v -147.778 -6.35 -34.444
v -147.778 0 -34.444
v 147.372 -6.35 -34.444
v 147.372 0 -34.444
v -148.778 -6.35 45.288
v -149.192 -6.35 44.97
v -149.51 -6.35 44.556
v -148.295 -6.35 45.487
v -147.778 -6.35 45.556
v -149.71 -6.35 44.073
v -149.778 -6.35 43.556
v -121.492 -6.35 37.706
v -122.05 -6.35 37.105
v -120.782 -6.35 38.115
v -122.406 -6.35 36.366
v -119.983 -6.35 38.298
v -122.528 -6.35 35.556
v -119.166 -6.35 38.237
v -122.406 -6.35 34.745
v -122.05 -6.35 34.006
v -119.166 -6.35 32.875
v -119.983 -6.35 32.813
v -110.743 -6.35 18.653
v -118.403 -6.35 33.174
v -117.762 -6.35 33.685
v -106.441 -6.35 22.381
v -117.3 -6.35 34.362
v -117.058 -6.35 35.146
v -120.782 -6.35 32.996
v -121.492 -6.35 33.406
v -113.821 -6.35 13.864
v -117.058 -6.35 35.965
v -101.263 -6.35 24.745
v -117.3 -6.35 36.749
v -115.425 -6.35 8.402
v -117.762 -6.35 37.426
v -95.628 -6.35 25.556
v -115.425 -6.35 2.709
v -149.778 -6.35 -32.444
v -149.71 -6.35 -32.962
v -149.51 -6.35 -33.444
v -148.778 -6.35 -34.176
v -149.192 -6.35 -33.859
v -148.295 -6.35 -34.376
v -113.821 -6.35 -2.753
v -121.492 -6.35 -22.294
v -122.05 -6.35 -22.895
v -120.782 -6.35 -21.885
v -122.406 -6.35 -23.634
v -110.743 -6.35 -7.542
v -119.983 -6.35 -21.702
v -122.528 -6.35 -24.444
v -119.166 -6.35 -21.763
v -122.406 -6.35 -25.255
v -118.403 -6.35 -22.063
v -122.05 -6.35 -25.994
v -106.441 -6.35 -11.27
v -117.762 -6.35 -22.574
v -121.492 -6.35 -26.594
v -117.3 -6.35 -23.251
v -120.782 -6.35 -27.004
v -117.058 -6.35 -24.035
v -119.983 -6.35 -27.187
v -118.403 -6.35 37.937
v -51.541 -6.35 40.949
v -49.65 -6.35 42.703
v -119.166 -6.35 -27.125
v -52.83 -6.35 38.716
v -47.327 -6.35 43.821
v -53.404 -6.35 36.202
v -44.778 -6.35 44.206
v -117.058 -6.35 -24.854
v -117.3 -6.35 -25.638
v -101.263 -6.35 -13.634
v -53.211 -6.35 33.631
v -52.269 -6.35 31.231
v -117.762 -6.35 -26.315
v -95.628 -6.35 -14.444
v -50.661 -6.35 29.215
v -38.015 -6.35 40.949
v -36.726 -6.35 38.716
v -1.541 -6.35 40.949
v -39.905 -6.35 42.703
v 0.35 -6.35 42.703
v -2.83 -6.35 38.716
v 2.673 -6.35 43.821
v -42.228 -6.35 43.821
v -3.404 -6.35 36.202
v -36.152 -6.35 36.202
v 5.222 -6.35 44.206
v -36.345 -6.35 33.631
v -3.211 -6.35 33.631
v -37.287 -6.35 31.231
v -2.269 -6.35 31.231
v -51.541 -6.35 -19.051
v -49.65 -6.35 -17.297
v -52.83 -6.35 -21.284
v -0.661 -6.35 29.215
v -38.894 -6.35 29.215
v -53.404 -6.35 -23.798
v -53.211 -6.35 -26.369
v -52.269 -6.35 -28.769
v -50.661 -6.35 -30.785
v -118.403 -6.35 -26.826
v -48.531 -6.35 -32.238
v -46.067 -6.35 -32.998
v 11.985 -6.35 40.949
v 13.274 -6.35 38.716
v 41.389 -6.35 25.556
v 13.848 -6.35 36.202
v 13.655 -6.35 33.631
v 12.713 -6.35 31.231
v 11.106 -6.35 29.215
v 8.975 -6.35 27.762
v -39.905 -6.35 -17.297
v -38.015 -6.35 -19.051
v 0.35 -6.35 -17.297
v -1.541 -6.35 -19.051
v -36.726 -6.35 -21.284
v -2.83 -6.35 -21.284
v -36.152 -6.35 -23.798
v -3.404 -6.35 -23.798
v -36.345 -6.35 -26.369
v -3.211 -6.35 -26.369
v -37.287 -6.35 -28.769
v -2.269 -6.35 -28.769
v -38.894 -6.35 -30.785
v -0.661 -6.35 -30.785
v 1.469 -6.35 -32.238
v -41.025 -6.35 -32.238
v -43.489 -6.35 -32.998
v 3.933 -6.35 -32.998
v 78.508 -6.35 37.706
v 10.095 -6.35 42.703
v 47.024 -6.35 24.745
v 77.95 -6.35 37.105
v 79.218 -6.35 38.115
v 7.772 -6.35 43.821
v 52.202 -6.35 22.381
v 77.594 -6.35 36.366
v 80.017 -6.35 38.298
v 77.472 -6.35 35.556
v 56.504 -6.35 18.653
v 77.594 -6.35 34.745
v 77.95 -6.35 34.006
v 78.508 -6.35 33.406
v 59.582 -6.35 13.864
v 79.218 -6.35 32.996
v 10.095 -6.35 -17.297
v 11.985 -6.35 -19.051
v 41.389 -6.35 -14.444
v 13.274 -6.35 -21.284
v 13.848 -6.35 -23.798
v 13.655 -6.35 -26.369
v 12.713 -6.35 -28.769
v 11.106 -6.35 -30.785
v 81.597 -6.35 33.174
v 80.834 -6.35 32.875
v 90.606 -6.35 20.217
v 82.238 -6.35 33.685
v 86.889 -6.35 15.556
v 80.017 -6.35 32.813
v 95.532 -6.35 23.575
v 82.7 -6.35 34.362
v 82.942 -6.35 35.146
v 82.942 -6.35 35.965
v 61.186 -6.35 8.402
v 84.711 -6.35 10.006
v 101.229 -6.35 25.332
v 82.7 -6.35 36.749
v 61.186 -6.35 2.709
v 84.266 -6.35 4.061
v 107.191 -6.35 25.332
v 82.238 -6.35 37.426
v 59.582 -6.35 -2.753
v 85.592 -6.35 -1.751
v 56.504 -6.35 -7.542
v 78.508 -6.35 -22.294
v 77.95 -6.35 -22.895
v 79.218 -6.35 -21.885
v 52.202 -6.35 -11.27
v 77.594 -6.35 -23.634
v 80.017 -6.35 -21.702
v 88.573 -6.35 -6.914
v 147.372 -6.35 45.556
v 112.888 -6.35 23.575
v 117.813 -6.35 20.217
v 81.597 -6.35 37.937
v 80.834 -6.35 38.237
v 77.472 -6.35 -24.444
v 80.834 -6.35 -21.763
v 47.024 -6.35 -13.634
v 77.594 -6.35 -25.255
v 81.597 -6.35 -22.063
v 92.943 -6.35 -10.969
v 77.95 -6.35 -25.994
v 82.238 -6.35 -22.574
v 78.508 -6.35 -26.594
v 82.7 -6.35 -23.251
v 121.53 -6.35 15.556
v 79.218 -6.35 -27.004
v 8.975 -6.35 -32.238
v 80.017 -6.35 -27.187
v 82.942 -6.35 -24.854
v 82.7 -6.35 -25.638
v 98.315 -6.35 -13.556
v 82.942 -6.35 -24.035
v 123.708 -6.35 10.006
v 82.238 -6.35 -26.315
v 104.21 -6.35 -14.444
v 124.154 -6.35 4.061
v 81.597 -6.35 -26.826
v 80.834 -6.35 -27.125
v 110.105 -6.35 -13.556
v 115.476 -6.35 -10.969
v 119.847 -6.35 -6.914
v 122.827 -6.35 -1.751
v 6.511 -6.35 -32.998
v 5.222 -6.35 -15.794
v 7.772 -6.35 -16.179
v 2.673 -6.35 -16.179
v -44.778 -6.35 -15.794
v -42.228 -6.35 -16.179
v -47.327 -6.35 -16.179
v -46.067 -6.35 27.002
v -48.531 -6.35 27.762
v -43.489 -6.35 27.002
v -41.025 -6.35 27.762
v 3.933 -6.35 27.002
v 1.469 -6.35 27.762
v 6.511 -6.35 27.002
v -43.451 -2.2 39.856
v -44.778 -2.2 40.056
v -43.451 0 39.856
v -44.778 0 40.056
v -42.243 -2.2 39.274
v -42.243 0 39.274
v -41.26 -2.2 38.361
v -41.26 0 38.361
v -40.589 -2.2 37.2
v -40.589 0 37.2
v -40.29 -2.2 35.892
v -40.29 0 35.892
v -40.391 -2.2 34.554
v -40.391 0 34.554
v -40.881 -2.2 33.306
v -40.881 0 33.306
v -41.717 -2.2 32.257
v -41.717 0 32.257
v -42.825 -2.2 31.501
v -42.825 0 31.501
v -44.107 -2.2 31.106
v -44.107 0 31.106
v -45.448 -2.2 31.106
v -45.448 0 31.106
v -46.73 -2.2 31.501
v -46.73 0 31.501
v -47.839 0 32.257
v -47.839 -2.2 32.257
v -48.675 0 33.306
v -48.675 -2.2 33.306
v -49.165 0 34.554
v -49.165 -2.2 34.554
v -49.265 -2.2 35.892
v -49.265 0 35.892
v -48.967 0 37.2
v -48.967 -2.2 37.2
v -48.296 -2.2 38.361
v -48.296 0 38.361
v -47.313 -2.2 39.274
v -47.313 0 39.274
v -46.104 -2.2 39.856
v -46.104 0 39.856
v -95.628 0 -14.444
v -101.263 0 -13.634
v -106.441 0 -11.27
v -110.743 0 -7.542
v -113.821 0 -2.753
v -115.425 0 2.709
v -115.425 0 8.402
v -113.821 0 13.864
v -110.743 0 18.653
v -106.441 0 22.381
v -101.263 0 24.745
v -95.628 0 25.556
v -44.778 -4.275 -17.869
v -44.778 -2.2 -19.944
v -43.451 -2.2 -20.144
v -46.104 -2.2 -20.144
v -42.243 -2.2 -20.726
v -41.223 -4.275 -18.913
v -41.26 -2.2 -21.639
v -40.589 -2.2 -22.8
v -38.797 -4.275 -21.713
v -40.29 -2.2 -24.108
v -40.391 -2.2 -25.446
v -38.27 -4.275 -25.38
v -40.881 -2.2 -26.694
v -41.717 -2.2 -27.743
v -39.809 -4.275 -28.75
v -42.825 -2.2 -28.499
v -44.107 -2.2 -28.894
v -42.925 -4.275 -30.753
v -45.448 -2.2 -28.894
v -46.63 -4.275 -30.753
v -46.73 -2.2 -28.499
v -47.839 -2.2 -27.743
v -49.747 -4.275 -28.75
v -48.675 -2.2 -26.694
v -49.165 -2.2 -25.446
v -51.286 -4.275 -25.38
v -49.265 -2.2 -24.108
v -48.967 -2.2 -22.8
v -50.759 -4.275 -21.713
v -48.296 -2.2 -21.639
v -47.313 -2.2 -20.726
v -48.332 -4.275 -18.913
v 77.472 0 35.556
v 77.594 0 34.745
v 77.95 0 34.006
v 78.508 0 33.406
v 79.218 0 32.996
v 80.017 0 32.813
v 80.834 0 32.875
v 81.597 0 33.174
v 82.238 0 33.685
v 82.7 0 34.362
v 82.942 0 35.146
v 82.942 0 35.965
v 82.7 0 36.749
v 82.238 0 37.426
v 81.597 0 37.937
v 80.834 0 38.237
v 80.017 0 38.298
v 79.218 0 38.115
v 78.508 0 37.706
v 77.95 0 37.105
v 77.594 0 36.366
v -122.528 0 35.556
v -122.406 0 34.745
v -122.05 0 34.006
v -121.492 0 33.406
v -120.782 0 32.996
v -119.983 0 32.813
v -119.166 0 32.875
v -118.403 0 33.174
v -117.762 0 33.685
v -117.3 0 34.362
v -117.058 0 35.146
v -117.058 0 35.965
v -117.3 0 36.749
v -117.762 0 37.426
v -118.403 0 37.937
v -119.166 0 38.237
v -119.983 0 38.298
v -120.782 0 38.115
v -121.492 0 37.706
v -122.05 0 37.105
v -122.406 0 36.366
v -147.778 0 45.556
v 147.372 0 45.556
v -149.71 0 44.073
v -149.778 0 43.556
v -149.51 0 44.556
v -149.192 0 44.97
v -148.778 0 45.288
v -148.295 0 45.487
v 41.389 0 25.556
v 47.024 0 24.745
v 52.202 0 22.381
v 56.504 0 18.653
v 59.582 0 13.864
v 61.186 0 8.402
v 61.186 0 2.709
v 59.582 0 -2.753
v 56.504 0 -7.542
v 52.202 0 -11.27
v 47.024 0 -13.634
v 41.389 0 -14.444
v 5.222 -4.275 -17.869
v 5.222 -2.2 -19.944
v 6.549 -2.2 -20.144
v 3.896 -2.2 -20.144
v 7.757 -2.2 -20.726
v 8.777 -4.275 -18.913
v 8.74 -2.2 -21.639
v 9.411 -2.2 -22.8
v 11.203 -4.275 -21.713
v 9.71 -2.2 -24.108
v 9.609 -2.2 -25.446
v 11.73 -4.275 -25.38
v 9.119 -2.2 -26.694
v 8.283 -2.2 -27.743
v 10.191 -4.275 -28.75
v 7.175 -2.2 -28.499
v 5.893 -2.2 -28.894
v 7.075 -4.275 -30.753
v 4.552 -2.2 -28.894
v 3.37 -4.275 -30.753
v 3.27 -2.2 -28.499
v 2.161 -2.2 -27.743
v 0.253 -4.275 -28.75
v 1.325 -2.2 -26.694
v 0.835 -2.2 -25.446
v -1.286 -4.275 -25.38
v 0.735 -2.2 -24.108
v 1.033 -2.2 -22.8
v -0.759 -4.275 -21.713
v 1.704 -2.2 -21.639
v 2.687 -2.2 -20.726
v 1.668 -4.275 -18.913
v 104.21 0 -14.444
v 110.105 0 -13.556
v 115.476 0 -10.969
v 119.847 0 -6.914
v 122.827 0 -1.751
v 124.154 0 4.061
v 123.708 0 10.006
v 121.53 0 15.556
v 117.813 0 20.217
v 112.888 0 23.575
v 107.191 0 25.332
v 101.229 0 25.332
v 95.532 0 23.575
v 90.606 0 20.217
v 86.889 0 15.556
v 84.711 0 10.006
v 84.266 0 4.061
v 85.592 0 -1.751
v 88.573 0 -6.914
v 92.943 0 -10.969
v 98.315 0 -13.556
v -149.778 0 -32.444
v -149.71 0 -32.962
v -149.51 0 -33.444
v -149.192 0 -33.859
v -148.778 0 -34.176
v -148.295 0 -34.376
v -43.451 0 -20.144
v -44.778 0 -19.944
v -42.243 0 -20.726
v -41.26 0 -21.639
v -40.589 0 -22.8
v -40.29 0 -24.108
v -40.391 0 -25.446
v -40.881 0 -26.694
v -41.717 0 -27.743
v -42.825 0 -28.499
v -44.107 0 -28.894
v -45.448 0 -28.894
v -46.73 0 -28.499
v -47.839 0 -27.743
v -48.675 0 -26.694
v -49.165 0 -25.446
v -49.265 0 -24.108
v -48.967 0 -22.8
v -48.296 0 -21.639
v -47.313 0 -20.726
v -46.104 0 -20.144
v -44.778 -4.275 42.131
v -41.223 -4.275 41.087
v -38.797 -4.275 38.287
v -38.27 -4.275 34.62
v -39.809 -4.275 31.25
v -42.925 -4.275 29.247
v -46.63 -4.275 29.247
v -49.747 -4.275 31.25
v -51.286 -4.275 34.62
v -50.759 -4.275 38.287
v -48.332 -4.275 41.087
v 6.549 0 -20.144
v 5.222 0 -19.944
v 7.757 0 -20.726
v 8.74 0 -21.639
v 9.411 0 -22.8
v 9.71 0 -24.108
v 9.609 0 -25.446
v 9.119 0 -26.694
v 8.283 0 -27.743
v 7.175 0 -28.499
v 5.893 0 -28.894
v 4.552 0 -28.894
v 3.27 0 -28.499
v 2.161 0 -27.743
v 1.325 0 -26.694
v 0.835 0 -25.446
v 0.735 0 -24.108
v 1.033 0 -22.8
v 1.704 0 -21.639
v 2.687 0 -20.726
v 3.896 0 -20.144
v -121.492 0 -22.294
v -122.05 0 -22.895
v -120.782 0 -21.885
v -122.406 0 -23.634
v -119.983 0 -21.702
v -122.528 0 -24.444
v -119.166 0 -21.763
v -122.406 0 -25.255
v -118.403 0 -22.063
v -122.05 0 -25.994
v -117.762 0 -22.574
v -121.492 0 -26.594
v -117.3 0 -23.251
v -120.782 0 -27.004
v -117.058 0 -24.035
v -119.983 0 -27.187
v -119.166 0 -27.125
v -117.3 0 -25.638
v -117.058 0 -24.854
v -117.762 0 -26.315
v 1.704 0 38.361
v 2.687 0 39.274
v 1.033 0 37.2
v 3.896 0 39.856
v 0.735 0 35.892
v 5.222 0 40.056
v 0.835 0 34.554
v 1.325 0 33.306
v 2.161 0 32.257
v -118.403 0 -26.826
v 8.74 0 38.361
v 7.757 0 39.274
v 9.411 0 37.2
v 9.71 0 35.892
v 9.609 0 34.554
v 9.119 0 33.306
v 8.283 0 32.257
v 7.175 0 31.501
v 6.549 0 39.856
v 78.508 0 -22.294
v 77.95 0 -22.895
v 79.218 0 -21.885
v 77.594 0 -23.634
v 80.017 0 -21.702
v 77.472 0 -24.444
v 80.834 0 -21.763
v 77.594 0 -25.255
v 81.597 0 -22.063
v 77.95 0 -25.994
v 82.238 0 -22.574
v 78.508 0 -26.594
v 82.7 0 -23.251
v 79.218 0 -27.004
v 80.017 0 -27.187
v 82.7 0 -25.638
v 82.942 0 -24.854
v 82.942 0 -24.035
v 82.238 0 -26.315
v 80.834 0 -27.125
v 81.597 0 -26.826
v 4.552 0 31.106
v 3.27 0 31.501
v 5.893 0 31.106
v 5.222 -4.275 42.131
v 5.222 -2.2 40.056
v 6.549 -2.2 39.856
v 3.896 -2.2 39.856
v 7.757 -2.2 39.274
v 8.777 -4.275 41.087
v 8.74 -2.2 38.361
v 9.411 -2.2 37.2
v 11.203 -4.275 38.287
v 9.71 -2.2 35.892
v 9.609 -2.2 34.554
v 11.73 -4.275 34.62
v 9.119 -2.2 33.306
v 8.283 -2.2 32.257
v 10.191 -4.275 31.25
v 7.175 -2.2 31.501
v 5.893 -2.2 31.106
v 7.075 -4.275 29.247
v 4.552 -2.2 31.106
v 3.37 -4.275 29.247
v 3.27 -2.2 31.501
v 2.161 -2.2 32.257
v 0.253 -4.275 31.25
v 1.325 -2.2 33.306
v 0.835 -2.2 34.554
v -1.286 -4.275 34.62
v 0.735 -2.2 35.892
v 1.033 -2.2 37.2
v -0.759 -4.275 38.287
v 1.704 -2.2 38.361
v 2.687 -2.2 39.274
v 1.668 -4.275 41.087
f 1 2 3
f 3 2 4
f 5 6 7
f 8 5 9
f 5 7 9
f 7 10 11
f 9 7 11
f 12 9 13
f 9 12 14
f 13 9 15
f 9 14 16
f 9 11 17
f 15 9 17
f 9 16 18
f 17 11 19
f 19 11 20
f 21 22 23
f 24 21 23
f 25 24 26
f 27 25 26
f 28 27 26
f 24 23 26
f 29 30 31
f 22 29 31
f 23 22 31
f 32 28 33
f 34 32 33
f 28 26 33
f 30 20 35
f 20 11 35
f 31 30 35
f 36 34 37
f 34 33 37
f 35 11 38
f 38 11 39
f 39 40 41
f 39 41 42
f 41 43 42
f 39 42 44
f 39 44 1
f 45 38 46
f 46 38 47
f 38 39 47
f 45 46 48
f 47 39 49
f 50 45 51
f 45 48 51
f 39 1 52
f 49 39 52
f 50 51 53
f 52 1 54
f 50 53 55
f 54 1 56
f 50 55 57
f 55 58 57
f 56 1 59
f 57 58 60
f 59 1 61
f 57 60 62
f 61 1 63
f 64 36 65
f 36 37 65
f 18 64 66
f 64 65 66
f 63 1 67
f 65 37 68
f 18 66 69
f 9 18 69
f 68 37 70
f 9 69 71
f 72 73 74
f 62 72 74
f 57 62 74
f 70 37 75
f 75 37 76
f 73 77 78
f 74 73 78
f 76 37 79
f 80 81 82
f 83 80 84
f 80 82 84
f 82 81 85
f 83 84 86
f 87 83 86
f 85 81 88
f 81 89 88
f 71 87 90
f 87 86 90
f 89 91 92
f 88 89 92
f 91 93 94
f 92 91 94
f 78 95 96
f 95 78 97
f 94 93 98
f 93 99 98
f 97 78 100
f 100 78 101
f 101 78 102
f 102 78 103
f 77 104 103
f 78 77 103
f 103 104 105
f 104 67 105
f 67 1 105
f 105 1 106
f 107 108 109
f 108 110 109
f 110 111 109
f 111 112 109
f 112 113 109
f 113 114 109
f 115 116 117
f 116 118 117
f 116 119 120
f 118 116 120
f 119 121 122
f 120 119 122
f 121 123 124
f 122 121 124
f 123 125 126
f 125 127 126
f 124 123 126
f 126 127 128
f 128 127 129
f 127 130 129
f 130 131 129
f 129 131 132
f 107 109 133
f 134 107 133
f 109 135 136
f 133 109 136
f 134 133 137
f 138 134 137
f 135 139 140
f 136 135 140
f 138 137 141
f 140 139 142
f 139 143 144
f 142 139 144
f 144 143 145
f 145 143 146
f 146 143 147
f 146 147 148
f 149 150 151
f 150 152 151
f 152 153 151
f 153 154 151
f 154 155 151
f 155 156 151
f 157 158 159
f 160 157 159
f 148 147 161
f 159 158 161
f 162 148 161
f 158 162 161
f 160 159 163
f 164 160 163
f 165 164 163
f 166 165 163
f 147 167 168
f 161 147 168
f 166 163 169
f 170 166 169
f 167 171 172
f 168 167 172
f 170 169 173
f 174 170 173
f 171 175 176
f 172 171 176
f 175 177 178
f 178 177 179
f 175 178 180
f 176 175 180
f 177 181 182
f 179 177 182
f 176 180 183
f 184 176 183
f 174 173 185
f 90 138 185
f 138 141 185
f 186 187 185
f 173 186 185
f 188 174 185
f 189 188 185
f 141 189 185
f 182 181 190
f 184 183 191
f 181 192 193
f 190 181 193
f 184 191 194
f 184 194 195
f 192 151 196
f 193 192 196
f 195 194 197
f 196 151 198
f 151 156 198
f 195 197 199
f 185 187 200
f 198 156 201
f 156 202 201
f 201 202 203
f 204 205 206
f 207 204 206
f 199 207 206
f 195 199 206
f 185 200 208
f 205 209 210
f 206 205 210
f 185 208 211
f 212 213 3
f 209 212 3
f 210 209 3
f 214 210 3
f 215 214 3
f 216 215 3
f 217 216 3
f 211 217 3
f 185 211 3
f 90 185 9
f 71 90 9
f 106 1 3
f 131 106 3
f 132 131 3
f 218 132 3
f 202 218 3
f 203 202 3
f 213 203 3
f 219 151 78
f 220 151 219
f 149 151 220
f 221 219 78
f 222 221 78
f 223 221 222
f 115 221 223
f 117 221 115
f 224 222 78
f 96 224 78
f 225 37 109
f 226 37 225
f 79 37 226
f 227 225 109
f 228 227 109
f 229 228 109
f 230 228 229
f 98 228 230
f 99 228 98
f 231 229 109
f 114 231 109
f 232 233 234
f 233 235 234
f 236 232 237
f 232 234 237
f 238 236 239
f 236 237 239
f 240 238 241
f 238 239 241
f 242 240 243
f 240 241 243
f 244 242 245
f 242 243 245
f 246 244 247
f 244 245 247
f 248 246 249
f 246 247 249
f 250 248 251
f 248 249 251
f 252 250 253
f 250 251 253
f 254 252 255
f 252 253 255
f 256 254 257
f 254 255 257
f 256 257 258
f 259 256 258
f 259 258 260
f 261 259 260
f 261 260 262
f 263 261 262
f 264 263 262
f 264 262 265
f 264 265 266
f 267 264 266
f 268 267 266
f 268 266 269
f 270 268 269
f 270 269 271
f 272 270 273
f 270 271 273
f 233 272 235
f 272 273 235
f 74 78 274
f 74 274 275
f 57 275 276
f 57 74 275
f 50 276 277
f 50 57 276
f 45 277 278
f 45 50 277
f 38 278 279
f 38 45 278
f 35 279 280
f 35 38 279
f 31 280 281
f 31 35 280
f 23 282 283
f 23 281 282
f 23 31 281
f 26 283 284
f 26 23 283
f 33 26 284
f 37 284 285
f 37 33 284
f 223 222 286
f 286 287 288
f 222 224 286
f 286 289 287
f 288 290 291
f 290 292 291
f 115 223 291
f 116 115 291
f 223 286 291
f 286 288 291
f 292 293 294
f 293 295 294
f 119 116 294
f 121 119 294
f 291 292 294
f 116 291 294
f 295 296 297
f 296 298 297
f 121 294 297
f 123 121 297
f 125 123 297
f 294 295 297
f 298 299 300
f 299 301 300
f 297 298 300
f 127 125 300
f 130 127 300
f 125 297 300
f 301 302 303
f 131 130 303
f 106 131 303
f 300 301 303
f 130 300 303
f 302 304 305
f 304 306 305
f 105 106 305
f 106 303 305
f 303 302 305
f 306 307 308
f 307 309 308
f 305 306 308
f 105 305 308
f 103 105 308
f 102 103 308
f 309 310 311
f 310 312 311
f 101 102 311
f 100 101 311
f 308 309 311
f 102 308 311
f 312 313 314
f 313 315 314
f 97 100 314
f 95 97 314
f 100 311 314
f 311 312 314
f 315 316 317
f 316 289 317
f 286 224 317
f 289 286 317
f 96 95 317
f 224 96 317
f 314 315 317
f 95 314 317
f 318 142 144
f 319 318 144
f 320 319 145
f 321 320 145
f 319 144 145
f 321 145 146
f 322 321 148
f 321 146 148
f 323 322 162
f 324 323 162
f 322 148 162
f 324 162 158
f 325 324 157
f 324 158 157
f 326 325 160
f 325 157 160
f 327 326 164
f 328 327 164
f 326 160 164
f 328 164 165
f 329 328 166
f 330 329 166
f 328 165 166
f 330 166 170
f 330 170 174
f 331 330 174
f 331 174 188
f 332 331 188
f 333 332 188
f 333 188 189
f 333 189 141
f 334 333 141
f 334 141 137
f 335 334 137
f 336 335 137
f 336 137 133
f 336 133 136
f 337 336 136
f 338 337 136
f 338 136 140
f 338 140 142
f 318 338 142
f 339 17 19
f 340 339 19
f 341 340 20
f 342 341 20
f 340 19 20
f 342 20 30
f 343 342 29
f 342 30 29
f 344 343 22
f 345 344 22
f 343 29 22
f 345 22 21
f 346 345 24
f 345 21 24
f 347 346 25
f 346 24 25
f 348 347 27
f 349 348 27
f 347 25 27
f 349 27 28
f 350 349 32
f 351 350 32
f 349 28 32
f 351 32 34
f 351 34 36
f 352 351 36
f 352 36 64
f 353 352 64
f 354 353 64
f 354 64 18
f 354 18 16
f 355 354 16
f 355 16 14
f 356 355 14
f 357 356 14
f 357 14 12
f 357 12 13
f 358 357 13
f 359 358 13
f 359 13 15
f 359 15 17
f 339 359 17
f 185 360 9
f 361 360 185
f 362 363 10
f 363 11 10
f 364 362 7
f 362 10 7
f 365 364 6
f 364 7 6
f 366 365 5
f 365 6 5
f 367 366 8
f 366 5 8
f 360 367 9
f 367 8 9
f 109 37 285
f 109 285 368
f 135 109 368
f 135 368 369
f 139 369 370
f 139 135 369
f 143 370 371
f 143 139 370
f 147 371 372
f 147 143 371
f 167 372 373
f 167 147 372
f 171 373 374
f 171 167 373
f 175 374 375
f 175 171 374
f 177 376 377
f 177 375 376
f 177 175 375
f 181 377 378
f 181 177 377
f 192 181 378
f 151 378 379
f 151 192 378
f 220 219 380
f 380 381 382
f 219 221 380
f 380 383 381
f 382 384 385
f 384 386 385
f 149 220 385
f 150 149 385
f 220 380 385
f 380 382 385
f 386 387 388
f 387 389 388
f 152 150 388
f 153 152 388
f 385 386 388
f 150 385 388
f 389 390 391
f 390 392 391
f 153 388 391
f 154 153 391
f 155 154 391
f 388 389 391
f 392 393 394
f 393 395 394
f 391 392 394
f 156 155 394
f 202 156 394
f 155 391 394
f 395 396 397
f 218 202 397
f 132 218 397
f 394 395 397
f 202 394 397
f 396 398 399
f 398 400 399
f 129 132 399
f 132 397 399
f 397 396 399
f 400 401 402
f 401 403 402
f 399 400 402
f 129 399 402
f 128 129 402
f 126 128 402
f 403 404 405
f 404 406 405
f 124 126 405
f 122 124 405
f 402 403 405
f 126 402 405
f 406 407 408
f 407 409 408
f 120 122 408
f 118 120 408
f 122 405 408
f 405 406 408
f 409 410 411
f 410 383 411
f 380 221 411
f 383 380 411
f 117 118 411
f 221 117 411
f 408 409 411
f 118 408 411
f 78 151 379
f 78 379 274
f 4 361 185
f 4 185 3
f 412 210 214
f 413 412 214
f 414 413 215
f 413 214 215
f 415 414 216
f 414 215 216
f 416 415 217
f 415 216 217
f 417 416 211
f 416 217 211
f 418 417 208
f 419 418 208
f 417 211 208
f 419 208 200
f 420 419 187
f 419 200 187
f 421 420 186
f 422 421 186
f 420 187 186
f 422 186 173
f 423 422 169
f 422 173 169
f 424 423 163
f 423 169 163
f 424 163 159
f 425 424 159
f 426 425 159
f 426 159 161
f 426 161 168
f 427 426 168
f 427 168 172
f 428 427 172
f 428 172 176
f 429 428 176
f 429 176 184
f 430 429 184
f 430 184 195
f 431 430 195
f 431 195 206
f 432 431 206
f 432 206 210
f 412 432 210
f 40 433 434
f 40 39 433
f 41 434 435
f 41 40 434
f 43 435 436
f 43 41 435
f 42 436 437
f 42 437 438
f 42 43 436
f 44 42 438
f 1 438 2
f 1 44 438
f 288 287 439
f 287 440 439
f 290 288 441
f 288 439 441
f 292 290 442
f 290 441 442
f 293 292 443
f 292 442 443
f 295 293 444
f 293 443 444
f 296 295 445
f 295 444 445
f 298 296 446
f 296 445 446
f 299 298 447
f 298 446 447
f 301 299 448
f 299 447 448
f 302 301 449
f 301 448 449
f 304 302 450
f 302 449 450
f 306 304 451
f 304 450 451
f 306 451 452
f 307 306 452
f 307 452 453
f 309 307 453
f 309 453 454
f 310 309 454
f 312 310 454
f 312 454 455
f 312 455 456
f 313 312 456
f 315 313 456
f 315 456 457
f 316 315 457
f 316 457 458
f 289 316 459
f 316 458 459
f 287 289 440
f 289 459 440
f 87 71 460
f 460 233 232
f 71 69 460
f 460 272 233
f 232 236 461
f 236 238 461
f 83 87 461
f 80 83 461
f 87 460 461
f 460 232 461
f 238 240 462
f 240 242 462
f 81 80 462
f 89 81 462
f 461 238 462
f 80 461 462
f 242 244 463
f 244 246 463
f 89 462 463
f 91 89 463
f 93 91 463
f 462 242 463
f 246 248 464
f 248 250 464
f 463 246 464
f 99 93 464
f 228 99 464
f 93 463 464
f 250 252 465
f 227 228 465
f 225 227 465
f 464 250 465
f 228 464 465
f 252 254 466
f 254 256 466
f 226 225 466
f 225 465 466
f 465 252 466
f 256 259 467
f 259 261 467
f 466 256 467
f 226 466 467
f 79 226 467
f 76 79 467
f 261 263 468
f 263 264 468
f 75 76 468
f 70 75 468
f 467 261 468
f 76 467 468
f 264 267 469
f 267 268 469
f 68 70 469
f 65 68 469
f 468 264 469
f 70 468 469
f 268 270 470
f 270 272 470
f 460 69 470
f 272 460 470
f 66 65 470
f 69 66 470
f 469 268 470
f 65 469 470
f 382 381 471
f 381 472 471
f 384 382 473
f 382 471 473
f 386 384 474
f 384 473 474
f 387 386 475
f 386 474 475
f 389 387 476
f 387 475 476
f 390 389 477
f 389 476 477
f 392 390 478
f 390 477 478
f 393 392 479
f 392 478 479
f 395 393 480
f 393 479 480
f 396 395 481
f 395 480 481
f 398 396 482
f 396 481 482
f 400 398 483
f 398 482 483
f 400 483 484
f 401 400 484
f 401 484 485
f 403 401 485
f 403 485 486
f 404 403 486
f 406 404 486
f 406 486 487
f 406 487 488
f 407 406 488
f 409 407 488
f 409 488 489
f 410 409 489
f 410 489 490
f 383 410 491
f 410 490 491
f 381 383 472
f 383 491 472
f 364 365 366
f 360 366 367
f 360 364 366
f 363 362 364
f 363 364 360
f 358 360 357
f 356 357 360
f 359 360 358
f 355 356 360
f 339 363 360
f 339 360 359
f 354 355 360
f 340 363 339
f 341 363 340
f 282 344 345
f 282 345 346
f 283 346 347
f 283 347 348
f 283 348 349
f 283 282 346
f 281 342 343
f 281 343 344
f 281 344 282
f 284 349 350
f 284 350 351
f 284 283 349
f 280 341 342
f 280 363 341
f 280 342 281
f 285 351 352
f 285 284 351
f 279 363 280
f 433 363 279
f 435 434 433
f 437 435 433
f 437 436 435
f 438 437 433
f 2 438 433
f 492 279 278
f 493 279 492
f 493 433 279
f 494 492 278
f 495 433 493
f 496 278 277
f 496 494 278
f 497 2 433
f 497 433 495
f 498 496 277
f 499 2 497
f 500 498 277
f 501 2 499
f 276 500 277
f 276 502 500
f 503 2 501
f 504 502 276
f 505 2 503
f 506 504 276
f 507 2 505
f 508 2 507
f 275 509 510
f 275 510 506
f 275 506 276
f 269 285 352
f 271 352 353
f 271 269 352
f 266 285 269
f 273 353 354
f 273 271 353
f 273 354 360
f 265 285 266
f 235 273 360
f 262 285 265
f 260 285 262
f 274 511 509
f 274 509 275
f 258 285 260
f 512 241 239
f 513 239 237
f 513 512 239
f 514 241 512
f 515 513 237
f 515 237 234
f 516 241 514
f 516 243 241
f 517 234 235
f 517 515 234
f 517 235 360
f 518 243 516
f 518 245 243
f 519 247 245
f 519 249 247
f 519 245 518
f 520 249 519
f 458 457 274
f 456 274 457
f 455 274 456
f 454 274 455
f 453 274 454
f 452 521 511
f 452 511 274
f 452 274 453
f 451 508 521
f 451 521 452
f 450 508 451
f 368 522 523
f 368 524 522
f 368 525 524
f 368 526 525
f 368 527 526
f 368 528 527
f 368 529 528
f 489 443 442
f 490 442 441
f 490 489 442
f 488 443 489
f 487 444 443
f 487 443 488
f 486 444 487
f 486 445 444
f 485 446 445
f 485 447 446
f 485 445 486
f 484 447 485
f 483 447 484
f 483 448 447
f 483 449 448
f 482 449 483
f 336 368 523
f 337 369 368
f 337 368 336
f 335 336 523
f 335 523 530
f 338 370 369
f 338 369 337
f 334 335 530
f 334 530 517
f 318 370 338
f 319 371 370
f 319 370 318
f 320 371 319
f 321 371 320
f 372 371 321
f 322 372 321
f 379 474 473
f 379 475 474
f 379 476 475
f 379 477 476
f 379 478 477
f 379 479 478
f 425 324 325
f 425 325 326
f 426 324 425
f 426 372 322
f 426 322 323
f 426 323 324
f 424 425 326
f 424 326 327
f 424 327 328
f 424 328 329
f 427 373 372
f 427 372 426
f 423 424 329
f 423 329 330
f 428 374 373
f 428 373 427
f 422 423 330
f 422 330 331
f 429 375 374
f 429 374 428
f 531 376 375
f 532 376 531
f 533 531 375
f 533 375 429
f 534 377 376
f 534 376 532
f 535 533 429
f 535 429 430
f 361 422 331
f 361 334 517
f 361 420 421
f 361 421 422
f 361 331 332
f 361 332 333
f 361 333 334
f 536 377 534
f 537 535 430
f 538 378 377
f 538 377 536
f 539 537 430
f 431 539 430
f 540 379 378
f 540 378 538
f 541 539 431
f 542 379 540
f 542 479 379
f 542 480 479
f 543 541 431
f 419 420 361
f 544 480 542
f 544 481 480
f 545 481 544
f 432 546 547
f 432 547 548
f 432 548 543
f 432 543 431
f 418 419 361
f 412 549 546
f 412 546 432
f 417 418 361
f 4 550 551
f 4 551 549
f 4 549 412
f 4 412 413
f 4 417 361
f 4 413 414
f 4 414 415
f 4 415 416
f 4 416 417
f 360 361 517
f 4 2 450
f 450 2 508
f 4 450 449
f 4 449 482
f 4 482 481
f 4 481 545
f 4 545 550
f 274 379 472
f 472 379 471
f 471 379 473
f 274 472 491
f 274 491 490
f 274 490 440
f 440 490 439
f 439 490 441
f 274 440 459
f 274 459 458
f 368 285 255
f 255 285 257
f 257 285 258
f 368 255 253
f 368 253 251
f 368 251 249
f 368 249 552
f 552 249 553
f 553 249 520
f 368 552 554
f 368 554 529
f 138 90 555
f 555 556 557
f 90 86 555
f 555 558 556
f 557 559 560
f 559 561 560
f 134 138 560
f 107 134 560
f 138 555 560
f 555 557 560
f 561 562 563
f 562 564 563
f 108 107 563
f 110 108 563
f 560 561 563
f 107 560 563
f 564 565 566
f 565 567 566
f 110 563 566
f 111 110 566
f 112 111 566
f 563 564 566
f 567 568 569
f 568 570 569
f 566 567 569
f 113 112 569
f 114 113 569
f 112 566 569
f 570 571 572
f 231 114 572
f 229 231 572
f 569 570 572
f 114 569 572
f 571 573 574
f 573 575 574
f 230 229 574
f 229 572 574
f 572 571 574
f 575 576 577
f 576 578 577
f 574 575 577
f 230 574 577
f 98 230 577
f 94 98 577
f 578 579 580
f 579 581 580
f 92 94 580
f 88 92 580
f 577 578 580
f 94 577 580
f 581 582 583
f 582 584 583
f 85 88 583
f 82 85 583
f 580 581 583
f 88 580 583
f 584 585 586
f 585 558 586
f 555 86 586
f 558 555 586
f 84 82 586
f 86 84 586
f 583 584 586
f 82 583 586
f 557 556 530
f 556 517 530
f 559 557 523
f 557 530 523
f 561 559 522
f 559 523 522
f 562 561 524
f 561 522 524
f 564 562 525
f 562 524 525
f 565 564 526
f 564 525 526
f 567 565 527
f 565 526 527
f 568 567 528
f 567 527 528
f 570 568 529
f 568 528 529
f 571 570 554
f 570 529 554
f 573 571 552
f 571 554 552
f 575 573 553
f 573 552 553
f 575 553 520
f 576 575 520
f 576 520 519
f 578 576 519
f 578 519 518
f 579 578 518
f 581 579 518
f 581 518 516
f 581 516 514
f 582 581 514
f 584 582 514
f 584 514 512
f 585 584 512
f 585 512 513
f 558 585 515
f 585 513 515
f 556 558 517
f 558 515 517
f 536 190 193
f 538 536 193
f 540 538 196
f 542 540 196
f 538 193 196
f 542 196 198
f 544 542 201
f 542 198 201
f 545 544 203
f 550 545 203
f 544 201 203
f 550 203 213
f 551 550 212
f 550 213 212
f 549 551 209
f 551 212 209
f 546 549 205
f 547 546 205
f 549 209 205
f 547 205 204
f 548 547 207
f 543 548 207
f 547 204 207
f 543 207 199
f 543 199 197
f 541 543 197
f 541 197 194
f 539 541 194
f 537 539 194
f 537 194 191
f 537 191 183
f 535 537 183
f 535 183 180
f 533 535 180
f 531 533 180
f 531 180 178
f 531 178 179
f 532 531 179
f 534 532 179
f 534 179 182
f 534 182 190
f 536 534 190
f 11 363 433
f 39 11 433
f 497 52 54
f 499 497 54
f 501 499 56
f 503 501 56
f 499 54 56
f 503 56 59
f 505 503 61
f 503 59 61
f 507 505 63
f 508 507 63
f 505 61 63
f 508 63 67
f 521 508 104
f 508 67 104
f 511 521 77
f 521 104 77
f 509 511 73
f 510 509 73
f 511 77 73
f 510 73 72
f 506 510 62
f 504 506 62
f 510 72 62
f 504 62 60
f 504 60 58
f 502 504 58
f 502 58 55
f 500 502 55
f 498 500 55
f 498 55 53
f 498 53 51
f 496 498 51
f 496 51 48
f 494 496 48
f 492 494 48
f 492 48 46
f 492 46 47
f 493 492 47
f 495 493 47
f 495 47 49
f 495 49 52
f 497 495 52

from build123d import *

# Parameters (mm, degrees)
CROQUIS1_W                                      = 297.15
CROQUIS1_H                                      = 80
BRIDA_BASE1_DEPTH                               = 6.35
REDONDEO1_R                                     = 2
TALADRO_DE_MARGEN_PARA_M51_D                    = 5.5
CROQUIS9_R                                      = 20
CORTAR_EXTRUIR1_DEPTH                           = 10
CSK_FOR_M8_OVAL_HEAD_MACHINE_SCREW1_D           = 9
CSK_FOR_M8_OVAL_HEAD_MACHINE_SCREW1_CSINK_D     = 17.3
CSK_FOR_M8_OVAL_HEAD_MACHINE_SCREW1_CSINK_ANGLE = 90


# Sheet-metal steps are written as plain solids
with BuildPart() as part:
    # Croquis1 → Brida base1 (new body)
    with BuildSketch(Plane(origin=(0, 0, 0), x_dir=(1, 0, 0), z_dir=(0, 1, 0))):
        with Locations((-1.202777778, -5.555555556)):
            Rectangle(CROQUIS1_W, CROQUIS1_H)
    extrude(amount=-BRIDA_BASE1_DEPTH)

    # Redondeo1
    redondeo1_edges = [part.edges().sort_by_distance(p)[0] for p in [
        (-149.777777778, -3.175, -34.444444444),
        (-149.777777778, -3.175, 45.555555556),
    ]]
    fillet(redondeo1_edges, radius=REDONDEO1_R)

    # Taladro de margen para M51 (through all)
    with Locations(Plane(origin=(0, 0, 0), x_dir=(1, 0, 0), z_dir=(0, 1, 0))):
        with Locations((-119.777777778, 24.444444444), (-119.777777778, -35.555555556), (80.222222222, -35.555555556), (80.222222222, 24.444444444)):
            Hole(TALADRO_DE_MARGEN_PARA_M51_D / 2)

    # Croquis9 → Cortar-Extruir1 (cut)
    with BuildSketch(Plane(origin=(0, -6.35, 0), x_dir=(-1, 0, 0), z_dir=(0, -1, 0))):
        with Locations(Location((-104.209895864, -5.555555556, 0), (0, 0, 90))):
            Circle(CROQUIS9_R)
        with BuildLine():
            Line((-41.389105309, 14.444444444), (95.628093505, 14.444444444))
            ThreePointArc((95.628093505, 14.444444444), (115.628093505, -5.555555556), (95.628093505, -25.555555556))
            Line((95.628093505, -25.555555556), (-41.389105309, -25.555555556))
            ThreePointArc((-41.389105309, -25.555555556), (-61.389105309, -5.555555556), (-41.389105309, 14.444444444))
        make_face()
    extrude(amount=-CORTAR_EXTRUIR1_DEPTH, mode=Mode.SUBTRACT)

    # CSK for M8 Oval Head Machine Screw1 (through all)
    with Locations(Plane(origin=(-44.777777778, -6.35, -24.444444444), x_dir=(0, 0, -1), z_dir=(0, -1, 0))):
        with Locations((0, 0), (0, 50), (-60, 50), (-60, 0)):
            CounterSinkHole(CSK_FOR_M8_OVAL_HEAD_MACHINE_SCREW1_D / 2, CSK_FOR_M8_OVAL_HEAD_MACHINE_SCREW1_CSINK_D / 2, counter_sink_angle=CSK_FOR_M8_OVAL_HEAD_MACHINE_SCREW1_CSINK_ANGLE)


solid = part.part
